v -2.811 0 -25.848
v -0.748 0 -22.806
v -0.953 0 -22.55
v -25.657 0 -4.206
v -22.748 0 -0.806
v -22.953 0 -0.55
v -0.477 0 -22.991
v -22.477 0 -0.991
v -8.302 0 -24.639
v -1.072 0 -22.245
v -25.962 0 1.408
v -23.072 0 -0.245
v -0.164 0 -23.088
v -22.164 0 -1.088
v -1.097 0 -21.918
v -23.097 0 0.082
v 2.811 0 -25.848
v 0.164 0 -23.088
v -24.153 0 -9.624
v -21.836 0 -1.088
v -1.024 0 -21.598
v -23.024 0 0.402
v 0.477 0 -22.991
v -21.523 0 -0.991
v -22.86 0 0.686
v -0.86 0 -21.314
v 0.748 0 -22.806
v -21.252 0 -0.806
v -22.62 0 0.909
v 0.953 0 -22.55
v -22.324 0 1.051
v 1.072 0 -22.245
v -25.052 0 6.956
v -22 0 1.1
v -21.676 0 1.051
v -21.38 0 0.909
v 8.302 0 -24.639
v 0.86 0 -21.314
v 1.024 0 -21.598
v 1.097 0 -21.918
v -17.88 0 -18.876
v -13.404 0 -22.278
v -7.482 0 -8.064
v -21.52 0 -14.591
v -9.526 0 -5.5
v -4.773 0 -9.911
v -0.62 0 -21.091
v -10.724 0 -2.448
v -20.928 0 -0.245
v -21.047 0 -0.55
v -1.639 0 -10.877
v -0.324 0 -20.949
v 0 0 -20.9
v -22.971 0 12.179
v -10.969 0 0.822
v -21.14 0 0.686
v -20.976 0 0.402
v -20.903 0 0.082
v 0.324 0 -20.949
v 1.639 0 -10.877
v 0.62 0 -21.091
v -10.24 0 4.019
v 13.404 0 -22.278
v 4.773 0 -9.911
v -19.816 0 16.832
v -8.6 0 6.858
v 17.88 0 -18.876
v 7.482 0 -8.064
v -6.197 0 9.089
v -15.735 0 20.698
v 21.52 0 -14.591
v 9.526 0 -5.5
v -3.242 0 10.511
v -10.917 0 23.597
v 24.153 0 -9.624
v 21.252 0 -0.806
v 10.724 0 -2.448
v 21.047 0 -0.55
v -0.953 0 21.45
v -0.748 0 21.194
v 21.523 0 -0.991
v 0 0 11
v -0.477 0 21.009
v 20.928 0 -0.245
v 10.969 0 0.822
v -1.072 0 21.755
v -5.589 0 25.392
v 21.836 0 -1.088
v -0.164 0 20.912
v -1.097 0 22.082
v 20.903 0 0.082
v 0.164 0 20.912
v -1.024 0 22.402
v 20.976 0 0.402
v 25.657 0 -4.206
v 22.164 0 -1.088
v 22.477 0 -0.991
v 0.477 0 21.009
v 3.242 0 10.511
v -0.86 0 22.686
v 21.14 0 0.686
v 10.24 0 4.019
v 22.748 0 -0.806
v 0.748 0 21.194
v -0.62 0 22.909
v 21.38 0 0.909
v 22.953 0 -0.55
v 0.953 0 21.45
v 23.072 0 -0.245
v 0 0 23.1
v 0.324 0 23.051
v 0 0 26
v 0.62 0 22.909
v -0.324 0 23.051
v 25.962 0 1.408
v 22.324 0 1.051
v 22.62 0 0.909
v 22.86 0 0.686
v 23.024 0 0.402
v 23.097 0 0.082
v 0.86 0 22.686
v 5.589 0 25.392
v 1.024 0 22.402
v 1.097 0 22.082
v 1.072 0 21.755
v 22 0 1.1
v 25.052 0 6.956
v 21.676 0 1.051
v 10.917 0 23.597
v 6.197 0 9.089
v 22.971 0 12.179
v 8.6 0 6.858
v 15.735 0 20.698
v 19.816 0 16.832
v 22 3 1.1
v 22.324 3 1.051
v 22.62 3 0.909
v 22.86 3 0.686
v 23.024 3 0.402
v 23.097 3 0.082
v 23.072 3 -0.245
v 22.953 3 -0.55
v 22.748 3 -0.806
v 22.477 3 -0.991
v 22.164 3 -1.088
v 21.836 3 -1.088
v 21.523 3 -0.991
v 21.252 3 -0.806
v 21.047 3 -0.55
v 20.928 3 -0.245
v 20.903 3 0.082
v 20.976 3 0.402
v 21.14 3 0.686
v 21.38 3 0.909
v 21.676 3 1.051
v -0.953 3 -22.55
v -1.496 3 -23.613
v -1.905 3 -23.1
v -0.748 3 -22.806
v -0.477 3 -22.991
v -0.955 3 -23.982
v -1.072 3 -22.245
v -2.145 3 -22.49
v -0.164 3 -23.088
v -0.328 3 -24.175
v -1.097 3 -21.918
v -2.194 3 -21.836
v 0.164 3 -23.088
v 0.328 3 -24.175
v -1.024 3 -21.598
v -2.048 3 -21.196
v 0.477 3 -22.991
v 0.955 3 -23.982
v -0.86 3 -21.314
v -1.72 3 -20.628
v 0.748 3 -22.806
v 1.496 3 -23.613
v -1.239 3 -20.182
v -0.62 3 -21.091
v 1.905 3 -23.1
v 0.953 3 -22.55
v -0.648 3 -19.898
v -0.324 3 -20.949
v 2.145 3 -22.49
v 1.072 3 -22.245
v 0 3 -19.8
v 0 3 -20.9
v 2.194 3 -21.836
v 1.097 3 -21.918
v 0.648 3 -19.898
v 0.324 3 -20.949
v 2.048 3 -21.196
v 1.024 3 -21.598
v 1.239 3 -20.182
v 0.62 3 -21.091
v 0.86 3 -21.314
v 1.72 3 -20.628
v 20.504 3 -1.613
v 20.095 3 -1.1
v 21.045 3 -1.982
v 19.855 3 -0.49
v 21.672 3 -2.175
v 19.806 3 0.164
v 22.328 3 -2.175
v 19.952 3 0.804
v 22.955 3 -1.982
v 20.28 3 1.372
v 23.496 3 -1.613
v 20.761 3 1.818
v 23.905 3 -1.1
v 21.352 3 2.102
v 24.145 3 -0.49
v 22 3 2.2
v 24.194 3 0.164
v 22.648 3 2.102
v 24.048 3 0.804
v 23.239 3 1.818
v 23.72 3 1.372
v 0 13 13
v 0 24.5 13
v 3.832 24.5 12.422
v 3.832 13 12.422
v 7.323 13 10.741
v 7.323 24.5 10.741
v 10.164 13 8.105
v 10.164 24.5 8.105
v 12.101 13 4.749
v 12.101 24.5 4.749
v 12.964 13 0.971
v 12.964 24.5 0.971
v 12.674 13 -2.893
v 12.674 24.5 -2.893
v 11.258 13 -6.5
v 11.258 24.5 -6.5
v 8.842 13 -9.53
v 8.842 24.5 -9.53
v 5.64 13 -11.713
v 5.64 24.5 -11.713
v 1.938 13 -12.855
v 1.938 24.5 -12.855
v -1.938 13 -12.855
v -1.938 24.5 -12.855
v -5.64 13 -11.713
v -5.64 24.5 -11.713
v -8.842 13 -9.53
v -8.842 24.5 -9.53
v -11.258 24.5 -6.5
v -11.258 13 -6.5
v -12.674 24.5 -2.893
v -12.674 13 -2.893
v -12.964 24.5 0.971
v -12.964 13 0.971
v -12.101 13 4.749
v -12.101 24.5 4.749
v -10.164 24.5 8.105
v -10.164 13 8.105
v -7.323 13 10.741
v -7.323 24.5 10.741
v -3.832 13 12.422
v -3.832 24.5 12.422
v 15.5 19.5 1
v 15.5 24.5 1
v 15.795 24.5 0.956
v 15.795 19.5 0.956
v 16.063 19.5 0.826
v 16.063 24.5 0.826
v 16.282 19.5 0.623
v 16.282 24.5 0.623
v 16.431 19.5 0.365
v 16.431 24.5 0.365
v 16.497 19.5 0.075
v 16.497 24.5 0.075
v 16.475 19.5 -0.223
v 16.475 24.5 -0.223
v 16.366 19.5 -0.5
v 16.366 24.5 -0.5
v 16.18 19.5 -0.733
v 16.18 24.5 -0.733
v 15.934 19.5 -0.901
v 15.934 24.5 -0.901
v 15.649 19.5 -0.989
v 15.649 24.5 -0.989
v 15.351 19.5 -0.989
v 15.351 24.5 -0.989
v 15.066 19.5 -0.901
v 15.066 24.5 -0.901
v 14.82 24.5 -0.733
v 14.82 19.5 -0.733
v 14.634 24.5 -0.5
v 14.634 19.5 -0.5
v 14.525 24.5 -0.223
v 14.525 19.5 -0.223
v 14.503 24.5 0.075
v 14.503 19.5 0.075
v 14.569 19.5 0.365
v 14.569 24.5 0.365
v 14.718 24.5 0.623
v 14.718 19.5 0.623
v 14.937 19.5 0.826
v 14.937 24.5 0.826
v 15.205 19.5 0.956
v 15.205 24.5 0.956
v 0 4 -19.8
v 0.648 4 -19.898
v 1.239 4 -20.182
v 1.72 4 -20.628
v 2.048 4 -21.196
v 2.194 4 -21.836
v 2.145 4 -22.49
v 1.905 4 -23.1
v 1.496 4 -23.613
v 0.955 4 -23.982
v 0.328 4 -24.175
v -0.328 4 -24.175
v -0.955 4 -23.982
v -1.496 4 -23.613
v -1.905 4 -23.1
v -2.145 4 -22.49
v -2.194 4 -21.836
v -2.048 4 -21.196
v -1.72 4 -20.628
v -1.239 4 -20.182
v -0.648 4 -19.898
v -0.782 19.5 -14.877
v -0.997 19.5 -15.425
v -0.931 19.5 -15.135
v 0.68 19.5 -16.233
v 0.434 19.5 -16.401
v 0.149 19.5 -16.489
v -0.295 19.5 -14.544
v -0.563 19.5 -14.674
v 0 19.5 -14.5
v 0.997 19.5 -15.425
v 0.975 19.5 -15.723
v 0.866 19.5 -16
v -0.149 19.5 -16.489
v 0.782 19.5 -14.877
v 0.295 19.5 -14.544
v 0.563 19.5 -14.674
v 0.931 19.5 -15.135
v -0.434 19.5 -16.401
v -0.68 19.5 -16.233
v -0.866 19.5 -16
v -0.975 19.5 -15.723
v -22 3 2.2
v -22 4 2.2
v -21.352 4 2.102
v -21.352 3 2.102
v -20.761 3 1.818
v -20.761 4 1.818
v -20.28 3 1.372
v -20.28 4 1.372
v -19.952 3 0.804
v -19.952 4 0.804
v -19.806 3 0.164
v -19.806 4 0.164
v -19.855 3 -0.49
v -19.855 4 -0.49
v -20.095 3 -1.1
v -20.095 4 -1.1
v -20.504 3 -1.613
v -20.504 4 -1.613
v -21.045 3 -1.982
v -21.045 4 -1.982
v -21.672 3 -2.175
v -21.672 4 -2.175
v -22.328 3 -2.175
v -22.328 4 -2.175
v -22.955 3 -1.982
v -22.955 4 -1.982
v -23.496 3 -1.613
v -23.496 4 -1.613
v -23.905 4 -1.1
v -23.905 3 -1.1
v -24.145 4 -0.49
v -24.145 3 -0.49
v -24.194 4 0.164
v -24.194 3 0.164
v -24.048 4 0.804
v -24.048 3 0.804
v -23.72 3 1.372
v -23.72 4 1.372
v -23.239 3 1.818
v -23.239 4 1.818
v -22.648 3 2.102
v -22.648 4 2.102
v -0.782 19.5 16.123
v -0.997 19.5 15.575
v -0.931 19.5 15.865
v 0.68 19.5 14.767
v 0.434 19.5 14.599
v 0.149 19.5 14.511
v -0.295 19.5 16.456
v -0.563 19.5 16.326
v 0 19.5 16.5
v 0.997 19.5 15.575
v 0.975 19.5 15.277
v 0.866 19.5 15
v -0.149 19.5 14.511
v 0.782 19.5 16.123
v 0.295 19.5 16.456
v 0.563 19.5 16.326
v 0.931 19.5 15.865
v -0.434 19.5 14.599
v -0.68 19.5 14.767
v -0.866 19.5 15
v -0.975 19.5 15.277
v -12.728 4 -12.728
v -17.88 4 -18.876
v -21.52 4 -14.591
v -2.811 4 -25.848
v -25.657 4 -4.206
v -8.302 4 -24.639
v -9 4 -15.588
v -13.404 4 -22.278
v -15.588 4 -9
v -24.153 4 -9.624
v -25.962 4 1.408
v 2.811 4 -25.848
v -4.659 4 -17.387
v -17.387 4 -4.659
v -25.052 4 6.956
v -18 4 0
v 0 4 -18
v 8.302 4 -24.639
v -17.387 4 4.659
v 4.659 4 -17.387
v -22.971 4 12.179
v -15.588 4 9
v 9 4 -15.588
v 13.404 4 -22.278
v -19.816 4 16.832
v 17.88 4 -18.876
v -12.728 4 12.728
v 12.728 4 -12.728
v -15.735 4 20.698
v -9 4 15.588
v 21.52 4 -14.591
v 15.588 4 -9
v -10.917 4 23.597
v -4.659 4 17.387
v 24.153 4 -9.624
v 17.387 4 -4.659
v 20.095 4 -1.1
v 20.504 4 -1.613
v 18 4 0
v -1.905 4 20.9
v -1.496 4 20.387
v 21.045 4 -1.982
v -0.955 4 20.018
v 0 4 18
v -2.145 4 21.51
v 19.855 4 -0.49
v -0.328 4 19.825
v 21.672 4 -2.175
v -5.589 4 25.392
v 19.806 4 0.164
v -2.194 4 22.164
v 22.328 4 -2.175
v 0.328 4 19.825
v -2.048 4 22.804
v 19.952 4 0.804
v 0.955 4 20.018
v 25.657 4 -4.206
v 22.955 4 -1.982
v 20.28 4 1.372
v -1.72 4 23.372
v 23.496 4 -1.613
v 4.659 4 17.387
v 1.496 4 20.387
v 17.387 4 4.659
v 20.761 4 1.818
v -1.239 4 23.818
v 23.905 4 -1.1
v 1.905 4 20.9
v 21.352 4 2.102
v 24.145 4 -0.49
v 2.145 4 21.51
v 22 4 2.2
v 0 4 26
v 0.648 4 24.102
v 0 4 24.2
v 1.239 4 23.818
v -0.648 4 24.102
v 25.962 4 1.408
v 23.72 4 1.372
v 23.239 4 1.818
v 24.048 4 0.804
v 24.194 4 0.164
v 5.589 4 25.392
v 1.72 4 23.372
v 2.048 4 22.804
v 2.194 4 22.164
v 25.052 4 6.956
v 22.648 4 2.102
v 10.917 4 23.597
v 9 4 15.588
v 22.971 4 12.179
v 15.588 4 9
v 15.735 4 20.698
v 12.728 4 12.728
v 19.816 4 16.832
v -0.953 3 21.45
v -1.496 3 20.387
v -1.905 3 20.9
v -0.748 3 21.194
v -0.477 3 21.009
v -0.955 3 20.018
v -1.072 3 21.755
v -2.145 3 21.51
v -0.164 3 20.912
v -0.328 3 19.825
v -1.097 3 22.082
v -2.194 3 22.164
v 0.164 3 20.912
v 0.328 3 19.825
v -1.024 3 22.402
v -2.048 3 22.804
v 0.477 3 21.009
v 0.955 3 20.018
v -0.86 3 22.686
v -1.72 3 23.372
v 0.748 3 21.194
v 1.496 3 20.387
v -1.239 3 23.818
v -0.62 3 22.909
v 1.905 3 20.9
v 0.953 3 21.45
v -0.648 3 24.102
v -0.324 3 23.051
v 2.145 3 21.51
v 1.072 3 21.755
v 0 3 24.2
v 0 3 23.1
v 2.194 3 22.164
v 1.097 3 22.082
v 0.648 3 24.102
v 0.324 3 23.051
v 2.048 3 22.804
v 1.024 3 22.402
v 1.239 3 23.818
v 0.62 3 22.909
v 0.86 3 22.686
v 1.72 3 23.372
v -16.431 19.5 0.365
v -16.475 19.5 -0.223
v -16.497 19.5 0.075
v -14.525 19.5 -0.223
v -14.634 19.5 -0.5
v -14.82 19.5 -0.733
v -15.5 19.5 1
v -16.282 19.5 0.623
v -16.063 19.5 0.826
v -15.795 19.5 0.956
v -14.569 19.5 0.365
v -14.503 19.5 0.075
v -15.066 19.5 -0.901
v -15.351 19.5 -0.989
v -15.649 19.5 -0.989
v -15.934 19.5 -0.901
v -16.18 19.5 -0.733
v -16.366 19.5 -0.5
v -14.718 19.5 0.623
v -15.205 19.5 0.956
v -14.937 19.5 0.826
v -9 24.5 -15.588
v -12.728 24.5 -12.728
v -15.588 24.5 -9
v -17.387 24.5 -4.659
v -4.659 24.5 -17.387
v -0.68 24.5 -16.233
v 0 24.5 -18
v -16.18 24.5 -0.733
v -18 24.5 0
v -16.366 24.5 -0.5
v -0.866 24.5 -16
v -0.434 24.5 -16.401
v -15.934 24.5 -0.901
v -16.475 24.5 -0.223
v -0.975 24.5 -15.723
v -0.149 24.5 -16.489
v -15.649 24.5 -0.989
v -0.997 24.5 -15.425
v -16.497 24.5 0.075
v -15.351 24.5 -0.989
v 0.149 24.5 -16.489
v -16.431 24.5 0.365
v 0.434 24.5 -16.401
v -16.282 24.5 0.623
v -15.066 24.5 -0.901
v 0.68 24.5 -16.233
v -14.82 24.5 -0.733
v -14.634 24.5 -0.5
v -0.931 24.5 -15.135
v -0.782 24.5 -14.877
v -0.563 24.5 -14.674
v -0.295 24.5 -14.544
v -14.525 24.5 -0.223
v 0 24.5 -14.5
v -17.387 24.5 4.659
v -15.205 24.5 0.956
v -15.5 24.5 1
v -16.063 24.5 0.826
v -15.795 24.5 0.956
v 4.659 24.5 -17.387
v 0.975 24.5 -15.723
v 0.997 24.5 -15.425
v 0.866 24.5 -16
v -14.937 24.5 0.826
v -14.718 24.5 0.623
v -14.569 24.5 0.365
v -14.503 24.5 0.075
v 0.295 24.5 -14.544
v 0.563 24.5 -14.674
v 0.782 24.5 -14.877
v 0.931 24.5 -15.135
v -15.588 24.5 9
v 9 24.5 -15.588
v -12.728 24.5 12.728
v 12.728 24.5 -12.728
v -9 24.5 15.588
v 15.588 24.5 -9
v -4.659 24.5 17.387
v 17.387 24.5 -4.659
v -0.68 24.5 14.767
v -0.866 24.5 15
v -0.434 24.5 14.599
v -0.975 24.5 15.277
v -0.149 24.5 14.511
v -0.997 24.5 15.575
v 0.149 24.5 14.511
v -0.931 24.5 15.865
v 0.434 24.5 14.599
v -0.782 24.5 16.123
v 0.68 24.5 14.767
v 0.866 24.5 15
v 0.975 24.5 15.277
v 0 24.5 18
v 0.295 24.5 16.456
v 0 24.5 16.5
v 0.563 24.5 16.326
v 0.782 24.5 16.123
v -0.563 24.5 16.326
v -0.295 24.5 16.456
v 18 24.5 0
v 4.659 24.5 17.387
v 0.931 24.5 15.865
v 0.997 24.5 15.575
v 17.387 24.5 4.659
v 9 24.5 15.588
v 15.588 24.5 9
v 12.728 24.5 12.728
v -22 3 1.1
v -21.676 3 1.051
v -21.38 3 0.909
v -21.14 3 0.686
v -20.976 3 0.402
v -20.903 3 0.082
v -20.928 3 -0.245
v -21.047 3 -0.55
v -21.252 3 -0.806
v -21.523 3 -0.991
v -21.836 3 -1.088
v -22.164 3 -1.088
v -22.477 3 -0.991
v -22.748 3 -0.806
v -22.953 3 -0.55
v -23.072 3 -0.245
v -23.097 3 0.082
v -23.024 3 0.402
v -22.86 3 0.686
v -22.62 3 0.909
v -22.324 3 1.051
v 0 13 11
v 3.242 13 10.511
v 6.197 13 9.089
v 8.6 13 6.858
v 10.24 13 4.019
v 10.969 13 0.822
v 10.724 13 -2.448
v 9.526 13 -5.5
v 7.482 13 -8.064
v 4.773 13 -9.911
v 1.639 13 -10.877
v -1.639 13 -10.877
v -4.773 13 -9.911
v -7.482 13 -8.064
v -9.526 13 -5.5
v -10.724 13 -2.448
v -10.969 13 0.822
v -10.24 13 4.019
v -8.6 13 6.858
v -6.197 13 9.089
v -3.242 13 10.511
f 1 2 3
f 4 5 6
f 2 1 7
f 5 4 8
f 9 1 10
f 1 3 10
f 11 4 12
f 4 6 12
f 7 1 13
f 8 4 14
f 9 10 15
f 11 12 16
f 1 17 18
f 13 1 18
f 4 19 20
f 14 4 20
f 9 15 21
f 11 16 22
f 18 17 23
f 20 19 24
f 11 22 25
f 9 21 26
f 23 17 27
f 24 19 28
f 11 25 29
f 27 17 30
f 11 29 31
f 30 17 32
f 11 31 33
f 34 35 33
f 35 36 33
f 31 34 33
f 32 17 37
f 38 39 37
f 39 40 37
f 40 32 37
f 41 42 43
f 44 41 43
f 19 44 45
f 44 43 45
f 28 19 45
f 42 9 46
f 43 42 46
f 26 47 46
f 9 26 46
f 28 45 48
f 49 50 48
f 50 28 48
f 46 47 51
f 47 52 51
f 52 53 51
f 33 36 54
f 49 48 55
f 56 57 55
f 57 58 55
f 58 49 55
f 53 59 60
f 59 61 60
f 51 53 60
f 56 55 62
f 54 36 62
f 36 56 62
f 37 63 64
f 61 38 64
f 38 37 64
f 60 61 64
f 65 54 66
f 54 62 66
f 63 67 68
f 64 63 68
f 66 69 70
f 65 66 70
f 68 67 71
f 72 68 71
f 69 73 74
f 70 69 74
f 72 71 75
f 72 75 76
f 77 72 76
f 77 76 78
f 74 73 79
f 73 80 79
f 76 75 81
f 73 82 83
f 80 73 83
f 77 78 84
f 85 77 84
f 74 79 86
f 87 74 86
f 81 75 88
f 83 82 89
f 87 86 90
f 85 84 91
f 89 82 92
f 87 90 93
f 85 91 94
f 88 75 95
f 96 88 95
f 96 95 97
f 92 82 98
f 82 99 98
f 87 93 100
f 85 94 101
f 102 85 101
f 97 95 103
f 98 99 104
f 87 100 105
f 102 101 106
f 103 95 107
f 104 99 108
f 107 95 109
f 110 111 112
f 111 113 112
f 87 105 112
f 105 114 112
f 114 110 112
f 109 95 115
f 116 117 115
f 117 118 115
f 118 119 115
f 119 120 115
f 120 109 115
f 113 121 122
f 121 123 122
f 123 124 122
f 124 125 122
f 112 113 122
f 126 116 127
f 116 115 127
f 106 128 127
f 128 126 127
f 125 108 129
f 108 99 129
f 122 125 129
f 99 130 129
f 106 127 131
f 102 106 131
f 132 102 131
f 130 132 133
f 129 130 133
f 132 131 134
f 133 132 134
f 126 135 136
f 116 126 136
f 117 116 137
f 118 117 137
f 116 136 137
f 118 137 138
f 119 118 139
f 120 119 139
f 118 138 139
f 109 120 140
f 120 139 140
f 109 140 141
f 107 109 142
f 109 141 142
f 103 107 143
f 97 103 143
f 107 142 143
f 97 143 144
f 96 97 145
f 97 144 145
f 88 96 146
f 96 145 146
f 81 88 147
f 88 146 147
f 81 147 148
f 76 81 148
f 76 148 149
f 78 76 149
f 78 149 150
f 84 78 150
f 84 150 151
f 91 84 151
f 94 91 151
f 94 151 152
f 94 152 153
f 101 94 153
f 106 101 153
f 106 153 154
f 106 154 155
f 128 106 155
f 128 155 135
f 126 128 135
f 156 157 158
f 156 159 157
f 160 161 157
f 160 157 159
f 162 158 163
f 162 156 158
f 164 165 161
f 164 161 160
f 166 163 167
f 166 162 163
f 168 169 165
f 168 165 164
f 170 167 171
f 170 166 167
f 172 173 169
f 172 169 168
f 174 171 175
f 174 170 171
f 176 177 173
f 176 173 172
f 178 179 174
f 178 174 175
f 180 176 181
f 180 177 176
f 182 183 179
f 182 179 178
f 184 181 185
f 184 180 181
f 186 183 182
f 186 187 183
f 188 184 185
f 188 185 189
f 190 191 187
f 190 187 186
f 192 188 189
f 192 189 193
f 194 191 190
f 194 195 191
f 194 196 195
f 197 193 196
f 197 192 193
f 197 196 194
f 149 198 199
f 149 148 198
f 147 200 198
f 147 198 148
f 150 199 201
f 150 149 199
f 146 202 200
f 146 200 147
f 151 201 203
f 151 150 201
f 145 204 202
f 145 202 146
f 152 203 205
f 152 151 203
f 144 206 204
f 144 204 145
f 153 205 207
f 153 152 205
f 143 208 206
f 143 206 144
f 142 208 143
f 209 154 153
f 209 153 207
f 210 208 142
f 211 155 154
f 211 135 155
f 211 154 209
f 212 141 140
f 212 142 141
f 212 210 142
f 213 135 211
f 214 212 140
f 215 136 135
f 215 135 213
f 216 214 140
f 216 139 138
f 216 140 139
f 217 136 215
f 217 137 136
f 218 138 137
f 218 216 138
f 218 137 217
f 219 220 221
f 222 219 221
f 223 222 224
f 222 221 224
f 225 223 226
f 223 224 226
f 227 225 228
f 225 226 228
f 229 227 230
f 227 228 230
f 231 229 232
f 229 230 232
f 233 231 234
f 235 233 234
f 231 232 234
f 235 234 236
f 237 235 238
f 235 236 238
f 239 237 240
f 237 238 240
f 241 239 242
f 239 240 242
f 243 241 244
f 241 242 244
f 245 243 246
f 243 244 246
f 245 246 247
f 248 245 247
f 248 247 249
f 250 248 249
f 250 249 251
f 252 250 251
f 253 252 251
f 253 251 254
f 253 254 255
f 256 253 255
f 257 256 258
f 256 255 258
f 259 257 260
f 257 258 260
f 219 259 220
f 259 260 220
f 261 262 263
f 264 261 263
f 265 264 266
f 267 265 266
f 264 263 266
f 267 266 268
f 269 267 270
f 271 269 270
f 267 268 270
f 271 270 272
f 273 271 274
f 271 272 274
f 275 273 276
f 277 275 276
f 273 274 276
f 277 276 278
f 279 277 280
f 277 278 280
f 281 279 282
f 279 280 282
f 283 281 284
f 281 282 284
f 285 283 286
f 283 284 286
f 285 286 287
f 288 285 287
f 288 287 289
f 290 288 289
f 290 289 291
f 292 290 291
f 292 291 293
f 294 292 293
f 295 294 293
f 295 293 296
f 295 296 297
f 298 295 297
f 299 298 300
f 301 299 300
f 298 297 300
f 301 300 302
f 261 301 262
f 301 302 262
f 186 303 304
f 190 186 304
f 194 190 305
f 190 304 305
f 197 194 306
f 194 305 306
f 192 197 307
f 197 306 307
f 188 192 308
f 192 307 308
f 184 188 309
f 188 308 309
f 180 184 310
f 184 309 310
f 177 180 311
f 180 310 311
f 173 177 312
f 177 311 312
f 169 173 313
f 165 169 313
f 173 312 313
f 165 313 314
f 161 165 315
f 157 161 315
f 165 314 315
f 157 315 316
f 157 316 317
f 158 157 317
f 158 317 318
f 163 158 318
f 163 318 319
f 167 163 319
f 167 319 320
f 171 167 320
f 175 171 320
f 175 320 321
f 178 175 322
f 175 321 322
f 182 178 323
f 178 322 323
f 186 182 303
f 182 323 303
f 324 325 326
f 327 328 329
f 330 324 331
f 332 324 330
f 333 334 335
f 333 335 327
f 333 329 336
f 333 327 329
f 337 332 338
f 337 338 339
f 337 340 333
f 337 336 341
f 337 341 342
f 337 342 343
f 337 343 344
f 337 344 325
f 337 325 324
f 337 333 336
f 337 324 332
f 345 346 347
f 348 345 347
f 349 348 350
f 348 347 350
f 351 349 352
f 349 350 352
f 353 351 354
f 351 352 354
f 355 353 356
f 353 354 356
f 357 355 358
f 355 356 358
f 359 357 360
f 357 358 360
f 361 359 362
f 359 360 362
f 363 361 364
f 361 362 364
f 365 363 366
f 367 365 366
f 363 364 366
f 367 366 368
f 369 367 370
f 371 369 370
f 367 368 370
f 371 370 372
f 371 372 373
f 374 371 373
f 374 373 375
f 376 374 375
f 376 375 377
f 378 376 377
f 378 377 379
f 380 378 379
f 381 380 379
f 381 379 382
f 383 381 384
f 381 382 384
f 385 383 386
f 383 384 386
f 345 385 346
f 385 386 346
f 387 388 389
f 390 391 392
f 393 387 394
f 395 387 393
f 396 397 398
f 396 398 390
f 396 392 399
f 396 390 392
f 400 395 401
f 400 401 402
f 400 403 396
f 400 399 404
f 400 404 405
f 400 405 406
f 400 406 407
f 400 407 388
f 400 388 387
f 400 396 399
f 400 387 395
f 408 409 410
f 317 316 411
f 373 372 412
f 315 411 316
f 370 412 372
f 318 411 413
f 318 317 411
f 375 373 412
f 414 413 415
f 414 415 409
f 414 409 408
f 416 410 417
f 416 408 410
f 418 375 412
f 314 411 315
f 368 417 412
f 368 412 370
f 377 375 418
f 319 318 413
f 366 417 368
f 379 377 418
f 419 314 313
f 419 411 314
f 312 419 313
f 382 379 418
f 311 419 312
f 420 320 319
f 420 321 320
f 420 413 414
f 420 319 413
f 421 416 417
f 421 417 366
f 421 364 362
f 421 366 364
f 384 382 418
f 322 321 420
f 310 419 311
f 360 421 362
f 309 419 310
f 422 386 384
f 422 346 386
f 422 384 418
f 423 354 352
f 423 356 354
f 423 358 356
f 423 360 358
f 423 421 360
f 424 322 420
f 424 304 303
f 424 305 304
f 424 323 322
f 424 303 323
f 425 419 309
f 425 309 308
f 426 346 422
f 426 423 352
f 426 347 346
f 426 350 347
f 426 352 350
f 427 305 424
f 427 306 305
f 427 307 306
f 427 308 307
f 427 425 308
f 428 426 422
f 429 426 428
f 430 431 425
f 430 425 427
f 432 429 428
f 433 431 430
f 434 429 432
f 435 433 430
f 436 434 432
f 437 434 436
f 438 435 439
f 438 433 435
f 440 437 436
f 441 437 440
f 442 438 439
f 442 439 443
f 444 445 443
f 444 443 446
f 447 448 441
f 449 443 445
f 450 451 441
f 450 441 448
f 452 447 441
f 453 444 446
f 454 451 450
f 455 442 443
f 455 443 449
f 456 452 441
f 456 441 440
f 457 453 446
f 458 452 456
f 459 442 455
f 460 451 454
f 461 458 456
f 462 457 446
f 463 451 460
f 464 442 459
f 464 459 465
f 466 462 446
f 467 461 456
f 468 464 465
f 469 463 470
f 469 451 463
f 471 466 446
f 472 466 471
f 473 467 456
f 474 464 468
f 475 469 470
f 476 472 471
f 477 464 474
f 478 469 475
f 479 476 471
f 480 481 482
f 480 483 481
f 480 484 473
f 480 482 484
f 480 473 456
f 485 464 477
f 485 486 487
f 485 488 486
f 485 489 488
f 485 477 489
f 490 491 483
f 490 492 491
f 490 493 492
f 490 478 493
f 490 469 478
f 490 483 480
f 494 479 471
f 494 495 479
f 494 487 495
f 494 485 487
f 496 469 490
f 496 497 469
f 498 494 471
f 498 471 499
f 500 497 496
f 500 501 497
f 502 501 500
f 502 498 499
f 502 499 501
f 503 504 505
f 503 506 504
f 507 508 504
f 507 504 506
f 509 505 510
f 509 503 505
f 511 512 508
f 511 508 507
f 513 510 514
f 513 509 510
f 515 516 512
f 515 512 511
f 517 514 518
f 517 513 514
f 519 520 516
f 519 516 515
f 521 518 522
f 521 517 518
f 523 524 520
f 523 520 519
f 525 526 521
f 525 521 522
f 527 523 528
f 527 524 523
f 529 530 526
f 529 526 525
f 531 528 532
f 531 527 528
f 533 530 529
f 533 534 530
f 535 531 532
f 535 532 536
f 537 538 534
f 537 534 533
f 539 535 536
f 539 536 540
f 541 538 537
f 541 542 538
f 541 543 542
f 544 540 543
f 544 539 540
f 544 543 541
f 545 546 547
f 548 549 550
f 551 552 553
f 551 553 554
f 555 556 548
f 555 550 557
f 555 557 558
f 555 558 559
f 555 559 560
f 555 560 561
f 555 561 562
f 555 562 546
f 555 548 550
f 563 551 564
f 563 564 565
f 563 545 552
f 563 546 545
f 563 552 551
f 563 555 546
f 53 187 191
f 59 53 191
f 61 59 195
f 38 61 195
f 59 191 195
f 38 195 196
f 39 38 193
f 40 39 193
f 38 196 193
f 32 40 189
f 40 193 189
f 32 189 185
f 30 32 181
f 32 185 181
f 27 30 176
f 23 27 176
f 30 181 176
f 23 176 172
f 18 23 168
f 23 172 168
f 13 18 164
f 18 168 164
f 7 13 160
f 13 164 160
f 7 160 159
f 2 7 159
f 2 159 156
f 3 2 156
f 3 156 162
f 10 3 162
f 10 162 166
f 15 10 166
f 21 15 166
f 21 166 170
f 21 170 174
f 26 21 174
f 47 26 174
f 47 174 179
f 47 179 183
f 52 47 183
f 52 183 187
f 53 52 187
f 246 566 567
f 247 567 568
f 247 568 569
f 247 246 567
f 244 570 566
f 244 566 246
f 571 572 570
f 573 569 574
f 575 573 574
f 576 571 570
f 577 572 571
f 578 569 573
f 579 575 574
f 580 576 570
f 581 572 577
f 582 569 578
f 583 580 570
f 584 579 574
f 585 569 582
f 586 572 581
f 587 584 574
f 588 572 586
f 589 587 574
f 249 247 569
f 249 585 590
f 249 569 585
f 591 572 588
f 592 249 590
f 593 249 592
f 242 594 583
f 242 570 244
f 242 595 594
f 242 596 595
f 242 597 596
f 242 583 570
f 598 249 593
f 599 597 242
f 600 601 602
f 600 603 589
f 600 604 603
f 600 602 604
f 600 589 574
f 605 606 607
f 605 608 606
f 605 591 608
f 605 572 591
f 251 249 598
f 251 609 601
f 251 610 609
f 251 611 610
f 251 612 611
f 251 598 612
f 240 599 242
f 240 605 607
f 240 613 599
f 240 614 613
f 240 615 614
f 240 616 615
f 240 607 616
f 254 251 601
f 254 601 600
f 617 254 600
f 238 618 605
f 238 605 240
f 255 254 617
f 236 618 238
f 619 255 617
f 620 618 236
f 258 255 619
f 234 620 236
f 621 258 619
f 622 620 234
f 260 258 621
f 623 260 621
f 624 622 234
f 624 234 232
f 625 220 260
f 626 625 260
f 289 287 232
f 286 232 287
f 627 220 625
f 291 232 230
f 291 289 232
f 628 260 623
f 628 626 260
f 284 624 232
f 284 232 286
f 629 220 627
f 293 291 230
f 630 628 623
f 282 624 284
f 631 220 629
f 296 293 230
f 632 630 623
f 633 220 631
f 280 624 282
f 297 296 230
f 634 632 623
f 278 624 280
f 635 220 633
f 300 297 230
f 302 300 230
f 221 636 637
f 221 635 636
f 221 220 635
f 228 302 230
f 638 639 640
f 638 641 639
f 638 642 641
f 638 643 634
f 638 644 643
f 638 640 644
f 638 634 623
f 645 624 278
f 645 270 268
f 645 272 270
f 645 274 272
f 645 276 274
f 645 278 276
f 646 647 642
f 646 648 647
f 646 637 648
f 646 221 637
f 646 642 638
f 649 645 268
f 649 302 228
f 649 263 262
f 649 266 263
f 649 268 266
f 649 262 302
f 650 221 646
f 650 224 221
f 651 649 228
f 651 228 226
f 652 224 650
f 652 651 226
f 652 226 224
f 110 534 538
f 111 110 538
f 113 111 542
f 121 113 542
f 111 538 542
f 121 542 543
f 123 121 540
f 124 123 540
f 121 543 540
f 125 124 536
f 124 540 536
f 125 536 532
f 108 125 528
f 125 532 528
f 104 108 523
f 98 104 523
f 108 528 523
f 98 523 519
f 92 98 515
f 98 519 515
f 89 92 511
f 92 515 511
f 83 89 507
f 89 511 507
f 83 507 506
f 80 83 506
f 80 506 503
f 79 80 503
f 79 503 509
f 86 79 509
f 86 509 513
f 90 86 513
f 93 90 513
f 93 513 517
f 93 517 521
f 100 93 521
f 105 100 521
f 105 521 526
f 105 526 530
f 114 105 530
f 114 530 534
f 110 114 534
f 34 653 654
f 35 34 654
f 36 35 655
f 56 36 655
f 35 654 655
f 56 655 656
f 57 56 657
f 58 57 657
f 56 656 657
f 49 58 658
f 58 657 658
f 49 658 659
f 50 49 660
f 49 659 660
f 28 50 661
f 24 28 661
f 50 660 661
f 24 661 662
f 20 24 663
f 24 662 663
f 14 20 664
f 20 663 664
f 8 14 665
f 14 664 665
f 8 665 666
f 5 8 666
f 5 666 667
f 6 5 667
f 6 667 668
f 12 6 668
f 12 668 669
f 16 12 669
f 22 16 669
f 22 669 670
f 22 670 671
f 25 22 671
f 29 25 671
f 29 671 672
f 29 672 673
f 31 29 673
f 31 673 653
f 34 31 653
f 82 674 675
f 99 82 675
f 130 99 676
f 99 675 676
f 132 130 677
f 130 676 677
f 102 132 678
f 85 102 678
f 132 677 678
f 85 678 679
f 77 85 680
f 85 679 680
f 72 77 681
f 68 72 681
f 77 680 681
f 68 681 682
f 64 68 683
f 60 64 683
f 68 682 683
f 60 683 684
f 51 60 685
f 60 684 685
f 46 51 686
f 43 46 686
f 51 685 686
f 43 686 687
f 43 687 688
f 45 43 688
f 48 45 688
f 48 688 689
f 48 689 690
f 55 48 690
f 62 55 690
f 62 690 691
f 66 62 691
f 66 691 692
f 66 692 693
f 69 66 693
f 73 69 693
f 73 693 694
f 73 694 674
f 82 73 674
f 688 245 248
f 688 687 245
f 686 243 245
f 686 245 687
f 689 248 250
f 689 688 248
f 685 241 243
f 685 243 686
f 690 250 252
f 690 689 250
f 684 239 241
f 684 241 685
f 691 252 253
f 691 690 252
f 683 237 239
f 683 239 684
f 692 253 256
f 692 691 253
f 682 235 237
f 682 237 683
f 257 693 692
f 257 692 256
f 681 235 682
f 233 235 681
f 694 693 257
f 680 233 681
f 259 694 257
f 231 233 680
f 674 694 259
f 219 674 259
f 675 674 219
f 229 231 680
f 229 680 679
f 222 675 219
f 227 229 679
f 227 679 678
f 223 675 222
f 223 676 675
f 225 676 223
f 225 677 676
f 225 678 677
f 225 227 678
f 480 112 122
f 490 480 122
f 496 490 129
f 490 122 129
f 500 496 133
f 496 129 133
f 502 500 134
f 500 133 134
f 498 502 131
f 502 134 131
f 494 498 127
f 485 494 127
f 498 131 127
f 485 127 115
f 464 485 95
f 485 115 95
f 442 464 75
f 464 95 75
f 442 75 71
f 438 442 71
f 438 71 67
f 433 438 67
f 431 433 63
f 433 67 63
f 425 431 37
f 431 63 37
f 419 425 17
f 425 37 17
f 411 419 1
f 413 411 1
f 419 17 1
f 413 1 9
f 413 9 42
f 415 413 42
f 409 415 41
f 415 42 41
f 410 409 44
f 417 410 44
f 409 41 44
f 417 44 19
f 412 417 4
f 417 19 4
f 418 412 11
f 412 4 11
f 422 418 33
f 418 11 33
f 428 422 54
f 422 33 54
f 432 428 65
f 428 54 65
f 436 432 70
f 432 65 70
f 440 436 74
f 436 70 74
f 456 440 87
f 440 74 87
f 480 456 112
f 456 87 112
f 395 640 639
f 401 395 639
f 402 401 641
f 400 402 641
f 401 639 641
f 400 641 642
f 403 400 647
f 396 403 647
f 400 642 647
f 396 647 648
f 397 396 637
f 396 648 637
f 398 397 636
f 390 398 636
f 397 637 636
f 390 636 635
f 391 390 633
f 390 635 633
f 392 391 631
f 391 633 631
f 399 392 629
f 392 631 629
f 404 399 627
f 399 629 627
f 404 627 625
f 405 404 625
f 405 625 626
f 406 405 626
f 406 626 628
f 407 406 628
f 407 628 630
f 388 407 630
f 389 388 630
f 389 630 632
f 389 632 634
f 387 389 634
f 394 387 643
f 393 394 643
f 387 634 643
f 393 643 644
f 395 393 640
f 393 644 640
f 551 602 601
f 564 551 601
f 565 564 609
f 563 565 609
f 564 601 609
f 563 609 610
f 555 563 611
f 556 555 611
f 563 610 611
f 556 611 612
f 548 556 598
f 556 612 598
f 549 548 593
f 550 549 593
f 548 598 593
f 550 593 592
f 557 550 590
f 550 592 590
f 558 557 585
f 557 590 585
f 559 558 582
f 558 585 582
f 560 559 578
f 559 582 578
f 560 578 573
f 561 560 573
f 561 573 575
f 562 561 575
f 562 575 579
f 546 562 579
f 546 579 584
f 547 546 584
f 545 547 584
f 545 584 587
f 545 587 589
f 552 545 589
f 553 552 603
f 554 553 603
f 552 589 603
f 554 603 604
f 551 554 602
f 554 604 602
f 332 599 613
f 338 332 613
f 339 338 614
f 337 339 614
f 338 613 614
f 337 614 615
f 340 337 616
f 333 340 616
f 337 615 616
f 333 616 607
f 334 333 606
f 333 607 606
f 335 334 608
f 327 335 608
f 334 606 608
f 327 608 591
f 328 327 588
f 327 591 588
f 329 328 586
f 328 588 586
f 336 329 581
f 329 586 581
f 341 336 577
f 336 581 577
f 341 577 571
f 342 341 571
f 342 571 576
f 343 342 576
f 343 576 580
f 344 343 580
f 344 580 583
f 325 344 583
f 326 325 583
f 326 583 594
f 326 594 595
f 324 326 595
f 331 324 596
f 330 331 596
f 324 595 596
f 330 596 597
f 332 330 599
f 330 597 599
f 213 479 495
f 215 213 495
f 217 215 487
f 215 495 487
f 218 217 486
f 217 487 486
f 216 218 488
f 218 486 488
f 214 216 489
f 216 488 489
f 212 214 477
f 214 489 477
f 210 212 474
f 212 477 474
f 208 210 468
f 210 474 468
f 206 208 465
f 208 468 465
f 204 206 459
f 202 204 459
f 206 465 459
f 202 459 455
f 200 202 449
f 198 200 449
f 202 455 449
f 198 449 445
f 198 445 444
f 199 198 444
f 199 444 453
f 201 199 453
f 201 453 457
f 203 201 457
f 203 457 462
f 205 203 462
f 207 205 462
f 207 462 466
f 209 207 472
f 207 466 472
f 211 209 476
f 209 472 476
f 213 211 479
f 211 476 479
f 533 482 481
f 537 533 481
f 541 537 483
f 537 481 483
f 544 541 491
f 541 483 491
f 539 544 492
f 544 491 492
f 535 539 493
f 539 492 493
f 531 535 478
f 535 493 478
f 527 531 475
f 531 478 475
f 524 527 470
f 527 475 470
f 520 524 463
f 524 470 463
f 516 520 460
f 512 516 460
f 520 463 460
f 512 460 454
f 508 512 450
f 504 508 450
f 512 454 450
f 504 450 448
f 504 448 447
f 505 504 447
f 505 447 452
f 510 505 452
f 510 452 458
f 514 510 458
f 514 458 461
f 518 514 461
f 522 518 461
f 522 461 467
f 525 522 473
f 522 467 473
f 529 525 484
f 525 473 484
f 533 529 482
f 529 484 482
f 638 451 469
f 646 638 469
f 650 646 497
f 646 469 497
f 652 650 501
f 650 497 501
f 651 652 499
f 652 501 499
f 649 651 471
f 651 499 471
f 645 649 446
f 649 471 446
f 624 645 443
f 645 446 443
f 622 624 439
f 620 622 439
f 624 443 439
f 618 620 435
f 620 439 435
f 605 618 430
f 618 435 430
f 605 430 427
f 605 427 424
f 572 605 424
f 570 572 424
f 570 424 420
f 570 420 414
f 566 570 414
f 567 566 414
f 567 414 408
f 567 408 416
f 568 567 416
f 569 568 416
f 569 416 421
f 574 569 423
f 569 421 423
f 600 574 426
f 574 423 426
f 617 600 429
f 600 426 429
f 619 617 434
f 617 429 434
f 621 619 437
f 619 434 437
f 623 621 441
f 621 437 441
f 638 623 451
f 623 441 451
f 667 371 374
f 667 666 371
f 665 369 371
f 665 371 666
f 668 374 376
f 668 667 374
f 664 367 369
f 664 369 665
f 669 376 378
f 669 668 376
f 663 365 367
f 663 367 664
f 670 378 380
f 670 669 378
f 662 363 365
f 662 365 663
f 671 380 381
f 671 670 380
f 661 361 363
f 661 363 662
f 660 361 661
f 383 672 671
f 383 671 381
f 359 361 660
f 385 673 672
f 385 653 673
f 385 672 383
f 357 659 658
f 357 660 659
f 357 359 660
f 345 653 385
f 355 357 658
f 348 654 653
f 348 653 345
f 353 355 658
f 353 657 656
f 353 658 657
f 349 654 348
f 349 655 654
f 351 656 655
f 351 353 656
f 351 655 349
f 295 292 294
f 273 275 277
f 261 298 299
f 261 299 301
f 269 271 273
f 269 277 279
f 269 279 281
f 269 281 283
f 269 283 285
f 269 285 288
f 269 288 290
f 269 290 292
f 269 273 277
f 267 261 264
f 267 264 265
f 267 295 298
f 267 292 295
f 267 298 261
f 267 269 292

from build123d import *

# Parameters (mm, degrees)
SKETCH_1_R          = 26
EXTRUDE_1_DEPTH     = 4
SKETCH_2_R          = 18
EXTRUDE_2_DEPTH     = 20.5
SKETCH_3_R          = 13
CUT_EXTRUDE_1_DEPTH = 11.5
SKETCH_4_R          = 2.2
CUT_EXTRUDE_2_DEPTH = 1
SKETCH_5_R          = 1.1
CUT_EXTRUDE_3_DEPTH = 43.09809972
SKETCH_6_R          = 11
CUT_EXTRUDE_4_DEPTH = 40
SKETCH_7_R          = 1
CUT_EXTRUDE_5_DEPTH = 5


with BuildPart() as part:
    # Эскиз1 → Бобышка-Вытянуть1 (new body)
    with BuildSketch(Plane(origin=(0, 0, 0), x_dir=(1, 0, 0), z_dir=(0, 1, 0))):
        with Locations(Location((0, 0, 0), (0, 0, 270))):
            Circle(SKETCH_1_R)
    extrude(amount=EXTRUDE_1_DEPTH)

    # Эскиз2 → Бобышка-Вытянуть2 (add)
    with BuildSketch(Plane(origin=(0, 4, 0), x_dir=(1, 0, 0), z_dir=(0, 1, 0))):
        with Locations(Location((0, 0, 0), (0, 0, 270))):
            Circle(SKETCH_2_R)
    extrude(amount=EXTRUDE_2_DEPTH)

    # Эскиз3 → Вырез-Вытянуть1 (cut)
    with BuildSketch(Plane(origin=(0, 24.5, 0), x_dir=(1, 0, 0), z_dir=(0, 1, 0))):
        with Locations(Location((0, 0, 0), (0, 0, 270))):
            Circle(SKETCH_3_R)
    extrude(amount=-CUT_EXTRUDE_1_DEPTH, mode=Mode.SUBTRACT)

    # Эскиз4 → Вырез-Вытянуть2 (cut)
    with BuildSketch(Plane(origin=(0, 4, 0), x_dir=(1, 0, 0), z_dir=(0, 1, 0))):
        with Locations(Location((-22, 0, 0), (0, 0, 270))):
            Circle(SKETCH_4_R)
        with Locations(Location((0, 22, 0), (0, 0, 270))):
            Circle(SKETCH_4_R)
        with Locations(Location((22, 0, 0), (0, 0, 270))):
            Circle(SKETCH_4_R)
        with Locations(Location((0, -22, 0), (0, 0, 270))):
            Circle(SKETCH_4_R)
    extrude(amount=-CUT_EXTRUDE_2_DEPTH, mode=Mode.SUBTRACT)

    # Эскиз5 → Вырез-Вытянуть3 (cut, through all)
    with BuildSketch(Plane(origin=(0, 4, 0), x_dir=(1, 0, 0), z_dir=(0, 1, 0))):
        with Locations(Location((-22, 0, 0), (0, 0, 270))):
            Circle(SKETCH_5_R)
        with Locations(Location((0, 22, 0), (0, 0, 270))):
            Circle(SKETCH_5_R)
        with Locations(Location((22, 0, 0), (0, 0, 270))):
            Circle(SKETCH_5_R)
        with Locations(Location((0, -22, 0), (0, 0, 270))):
            Circle(SKETCH_5_R)
    extrude(amount=-CUT_EXTRUDE_3_DEPTH, mode=Mode.SUBTRACT)

    # Эскиз6 → Вырез-Вытянуть4 (cut, through all)
    with BuildSketch(Plane(origin=(0, 13, 0), x_dir=(1, 0, 0), z_dir=(0, 1, 0))):
        with Locations(Location((0, 0, 0), (0, 0, 270))):
            Circle(SKETCH_6_R)
    extrude(amount=-CUT_EXTRUDE_4_DEPTH, mode=Mode.SUBTRACT)

    # Эскиз7 → Вырез-Вытянуть5 (cut)
    with BuildSketch(Plane(origin=(0, 24.5, 0), x_dir=(1, 0, 0), z_dir=(0, 1, 0))):
        with Locations(Location((-15.5, 0, 0), (0, 0, 270))):
            Circle(SKETCH_7_R)
        with Locations(Location((0, 15.5, 0), (0, 0, 270))):
            Circle(SKETCH_7_R)
        with Locations(Location((15.5, 0, 0), (0, 0, 270))):
            Circle(SKETCH_7_R)
        with Locations(Location((0, -15.5, 0), (0, 0, 270))):
            Circle(SKETCH_7_R)
    extrude(amount=-CUT_EXTRUDE_5_DEPTH, mode=Mode.SUBTRACT)


solid = part.part
